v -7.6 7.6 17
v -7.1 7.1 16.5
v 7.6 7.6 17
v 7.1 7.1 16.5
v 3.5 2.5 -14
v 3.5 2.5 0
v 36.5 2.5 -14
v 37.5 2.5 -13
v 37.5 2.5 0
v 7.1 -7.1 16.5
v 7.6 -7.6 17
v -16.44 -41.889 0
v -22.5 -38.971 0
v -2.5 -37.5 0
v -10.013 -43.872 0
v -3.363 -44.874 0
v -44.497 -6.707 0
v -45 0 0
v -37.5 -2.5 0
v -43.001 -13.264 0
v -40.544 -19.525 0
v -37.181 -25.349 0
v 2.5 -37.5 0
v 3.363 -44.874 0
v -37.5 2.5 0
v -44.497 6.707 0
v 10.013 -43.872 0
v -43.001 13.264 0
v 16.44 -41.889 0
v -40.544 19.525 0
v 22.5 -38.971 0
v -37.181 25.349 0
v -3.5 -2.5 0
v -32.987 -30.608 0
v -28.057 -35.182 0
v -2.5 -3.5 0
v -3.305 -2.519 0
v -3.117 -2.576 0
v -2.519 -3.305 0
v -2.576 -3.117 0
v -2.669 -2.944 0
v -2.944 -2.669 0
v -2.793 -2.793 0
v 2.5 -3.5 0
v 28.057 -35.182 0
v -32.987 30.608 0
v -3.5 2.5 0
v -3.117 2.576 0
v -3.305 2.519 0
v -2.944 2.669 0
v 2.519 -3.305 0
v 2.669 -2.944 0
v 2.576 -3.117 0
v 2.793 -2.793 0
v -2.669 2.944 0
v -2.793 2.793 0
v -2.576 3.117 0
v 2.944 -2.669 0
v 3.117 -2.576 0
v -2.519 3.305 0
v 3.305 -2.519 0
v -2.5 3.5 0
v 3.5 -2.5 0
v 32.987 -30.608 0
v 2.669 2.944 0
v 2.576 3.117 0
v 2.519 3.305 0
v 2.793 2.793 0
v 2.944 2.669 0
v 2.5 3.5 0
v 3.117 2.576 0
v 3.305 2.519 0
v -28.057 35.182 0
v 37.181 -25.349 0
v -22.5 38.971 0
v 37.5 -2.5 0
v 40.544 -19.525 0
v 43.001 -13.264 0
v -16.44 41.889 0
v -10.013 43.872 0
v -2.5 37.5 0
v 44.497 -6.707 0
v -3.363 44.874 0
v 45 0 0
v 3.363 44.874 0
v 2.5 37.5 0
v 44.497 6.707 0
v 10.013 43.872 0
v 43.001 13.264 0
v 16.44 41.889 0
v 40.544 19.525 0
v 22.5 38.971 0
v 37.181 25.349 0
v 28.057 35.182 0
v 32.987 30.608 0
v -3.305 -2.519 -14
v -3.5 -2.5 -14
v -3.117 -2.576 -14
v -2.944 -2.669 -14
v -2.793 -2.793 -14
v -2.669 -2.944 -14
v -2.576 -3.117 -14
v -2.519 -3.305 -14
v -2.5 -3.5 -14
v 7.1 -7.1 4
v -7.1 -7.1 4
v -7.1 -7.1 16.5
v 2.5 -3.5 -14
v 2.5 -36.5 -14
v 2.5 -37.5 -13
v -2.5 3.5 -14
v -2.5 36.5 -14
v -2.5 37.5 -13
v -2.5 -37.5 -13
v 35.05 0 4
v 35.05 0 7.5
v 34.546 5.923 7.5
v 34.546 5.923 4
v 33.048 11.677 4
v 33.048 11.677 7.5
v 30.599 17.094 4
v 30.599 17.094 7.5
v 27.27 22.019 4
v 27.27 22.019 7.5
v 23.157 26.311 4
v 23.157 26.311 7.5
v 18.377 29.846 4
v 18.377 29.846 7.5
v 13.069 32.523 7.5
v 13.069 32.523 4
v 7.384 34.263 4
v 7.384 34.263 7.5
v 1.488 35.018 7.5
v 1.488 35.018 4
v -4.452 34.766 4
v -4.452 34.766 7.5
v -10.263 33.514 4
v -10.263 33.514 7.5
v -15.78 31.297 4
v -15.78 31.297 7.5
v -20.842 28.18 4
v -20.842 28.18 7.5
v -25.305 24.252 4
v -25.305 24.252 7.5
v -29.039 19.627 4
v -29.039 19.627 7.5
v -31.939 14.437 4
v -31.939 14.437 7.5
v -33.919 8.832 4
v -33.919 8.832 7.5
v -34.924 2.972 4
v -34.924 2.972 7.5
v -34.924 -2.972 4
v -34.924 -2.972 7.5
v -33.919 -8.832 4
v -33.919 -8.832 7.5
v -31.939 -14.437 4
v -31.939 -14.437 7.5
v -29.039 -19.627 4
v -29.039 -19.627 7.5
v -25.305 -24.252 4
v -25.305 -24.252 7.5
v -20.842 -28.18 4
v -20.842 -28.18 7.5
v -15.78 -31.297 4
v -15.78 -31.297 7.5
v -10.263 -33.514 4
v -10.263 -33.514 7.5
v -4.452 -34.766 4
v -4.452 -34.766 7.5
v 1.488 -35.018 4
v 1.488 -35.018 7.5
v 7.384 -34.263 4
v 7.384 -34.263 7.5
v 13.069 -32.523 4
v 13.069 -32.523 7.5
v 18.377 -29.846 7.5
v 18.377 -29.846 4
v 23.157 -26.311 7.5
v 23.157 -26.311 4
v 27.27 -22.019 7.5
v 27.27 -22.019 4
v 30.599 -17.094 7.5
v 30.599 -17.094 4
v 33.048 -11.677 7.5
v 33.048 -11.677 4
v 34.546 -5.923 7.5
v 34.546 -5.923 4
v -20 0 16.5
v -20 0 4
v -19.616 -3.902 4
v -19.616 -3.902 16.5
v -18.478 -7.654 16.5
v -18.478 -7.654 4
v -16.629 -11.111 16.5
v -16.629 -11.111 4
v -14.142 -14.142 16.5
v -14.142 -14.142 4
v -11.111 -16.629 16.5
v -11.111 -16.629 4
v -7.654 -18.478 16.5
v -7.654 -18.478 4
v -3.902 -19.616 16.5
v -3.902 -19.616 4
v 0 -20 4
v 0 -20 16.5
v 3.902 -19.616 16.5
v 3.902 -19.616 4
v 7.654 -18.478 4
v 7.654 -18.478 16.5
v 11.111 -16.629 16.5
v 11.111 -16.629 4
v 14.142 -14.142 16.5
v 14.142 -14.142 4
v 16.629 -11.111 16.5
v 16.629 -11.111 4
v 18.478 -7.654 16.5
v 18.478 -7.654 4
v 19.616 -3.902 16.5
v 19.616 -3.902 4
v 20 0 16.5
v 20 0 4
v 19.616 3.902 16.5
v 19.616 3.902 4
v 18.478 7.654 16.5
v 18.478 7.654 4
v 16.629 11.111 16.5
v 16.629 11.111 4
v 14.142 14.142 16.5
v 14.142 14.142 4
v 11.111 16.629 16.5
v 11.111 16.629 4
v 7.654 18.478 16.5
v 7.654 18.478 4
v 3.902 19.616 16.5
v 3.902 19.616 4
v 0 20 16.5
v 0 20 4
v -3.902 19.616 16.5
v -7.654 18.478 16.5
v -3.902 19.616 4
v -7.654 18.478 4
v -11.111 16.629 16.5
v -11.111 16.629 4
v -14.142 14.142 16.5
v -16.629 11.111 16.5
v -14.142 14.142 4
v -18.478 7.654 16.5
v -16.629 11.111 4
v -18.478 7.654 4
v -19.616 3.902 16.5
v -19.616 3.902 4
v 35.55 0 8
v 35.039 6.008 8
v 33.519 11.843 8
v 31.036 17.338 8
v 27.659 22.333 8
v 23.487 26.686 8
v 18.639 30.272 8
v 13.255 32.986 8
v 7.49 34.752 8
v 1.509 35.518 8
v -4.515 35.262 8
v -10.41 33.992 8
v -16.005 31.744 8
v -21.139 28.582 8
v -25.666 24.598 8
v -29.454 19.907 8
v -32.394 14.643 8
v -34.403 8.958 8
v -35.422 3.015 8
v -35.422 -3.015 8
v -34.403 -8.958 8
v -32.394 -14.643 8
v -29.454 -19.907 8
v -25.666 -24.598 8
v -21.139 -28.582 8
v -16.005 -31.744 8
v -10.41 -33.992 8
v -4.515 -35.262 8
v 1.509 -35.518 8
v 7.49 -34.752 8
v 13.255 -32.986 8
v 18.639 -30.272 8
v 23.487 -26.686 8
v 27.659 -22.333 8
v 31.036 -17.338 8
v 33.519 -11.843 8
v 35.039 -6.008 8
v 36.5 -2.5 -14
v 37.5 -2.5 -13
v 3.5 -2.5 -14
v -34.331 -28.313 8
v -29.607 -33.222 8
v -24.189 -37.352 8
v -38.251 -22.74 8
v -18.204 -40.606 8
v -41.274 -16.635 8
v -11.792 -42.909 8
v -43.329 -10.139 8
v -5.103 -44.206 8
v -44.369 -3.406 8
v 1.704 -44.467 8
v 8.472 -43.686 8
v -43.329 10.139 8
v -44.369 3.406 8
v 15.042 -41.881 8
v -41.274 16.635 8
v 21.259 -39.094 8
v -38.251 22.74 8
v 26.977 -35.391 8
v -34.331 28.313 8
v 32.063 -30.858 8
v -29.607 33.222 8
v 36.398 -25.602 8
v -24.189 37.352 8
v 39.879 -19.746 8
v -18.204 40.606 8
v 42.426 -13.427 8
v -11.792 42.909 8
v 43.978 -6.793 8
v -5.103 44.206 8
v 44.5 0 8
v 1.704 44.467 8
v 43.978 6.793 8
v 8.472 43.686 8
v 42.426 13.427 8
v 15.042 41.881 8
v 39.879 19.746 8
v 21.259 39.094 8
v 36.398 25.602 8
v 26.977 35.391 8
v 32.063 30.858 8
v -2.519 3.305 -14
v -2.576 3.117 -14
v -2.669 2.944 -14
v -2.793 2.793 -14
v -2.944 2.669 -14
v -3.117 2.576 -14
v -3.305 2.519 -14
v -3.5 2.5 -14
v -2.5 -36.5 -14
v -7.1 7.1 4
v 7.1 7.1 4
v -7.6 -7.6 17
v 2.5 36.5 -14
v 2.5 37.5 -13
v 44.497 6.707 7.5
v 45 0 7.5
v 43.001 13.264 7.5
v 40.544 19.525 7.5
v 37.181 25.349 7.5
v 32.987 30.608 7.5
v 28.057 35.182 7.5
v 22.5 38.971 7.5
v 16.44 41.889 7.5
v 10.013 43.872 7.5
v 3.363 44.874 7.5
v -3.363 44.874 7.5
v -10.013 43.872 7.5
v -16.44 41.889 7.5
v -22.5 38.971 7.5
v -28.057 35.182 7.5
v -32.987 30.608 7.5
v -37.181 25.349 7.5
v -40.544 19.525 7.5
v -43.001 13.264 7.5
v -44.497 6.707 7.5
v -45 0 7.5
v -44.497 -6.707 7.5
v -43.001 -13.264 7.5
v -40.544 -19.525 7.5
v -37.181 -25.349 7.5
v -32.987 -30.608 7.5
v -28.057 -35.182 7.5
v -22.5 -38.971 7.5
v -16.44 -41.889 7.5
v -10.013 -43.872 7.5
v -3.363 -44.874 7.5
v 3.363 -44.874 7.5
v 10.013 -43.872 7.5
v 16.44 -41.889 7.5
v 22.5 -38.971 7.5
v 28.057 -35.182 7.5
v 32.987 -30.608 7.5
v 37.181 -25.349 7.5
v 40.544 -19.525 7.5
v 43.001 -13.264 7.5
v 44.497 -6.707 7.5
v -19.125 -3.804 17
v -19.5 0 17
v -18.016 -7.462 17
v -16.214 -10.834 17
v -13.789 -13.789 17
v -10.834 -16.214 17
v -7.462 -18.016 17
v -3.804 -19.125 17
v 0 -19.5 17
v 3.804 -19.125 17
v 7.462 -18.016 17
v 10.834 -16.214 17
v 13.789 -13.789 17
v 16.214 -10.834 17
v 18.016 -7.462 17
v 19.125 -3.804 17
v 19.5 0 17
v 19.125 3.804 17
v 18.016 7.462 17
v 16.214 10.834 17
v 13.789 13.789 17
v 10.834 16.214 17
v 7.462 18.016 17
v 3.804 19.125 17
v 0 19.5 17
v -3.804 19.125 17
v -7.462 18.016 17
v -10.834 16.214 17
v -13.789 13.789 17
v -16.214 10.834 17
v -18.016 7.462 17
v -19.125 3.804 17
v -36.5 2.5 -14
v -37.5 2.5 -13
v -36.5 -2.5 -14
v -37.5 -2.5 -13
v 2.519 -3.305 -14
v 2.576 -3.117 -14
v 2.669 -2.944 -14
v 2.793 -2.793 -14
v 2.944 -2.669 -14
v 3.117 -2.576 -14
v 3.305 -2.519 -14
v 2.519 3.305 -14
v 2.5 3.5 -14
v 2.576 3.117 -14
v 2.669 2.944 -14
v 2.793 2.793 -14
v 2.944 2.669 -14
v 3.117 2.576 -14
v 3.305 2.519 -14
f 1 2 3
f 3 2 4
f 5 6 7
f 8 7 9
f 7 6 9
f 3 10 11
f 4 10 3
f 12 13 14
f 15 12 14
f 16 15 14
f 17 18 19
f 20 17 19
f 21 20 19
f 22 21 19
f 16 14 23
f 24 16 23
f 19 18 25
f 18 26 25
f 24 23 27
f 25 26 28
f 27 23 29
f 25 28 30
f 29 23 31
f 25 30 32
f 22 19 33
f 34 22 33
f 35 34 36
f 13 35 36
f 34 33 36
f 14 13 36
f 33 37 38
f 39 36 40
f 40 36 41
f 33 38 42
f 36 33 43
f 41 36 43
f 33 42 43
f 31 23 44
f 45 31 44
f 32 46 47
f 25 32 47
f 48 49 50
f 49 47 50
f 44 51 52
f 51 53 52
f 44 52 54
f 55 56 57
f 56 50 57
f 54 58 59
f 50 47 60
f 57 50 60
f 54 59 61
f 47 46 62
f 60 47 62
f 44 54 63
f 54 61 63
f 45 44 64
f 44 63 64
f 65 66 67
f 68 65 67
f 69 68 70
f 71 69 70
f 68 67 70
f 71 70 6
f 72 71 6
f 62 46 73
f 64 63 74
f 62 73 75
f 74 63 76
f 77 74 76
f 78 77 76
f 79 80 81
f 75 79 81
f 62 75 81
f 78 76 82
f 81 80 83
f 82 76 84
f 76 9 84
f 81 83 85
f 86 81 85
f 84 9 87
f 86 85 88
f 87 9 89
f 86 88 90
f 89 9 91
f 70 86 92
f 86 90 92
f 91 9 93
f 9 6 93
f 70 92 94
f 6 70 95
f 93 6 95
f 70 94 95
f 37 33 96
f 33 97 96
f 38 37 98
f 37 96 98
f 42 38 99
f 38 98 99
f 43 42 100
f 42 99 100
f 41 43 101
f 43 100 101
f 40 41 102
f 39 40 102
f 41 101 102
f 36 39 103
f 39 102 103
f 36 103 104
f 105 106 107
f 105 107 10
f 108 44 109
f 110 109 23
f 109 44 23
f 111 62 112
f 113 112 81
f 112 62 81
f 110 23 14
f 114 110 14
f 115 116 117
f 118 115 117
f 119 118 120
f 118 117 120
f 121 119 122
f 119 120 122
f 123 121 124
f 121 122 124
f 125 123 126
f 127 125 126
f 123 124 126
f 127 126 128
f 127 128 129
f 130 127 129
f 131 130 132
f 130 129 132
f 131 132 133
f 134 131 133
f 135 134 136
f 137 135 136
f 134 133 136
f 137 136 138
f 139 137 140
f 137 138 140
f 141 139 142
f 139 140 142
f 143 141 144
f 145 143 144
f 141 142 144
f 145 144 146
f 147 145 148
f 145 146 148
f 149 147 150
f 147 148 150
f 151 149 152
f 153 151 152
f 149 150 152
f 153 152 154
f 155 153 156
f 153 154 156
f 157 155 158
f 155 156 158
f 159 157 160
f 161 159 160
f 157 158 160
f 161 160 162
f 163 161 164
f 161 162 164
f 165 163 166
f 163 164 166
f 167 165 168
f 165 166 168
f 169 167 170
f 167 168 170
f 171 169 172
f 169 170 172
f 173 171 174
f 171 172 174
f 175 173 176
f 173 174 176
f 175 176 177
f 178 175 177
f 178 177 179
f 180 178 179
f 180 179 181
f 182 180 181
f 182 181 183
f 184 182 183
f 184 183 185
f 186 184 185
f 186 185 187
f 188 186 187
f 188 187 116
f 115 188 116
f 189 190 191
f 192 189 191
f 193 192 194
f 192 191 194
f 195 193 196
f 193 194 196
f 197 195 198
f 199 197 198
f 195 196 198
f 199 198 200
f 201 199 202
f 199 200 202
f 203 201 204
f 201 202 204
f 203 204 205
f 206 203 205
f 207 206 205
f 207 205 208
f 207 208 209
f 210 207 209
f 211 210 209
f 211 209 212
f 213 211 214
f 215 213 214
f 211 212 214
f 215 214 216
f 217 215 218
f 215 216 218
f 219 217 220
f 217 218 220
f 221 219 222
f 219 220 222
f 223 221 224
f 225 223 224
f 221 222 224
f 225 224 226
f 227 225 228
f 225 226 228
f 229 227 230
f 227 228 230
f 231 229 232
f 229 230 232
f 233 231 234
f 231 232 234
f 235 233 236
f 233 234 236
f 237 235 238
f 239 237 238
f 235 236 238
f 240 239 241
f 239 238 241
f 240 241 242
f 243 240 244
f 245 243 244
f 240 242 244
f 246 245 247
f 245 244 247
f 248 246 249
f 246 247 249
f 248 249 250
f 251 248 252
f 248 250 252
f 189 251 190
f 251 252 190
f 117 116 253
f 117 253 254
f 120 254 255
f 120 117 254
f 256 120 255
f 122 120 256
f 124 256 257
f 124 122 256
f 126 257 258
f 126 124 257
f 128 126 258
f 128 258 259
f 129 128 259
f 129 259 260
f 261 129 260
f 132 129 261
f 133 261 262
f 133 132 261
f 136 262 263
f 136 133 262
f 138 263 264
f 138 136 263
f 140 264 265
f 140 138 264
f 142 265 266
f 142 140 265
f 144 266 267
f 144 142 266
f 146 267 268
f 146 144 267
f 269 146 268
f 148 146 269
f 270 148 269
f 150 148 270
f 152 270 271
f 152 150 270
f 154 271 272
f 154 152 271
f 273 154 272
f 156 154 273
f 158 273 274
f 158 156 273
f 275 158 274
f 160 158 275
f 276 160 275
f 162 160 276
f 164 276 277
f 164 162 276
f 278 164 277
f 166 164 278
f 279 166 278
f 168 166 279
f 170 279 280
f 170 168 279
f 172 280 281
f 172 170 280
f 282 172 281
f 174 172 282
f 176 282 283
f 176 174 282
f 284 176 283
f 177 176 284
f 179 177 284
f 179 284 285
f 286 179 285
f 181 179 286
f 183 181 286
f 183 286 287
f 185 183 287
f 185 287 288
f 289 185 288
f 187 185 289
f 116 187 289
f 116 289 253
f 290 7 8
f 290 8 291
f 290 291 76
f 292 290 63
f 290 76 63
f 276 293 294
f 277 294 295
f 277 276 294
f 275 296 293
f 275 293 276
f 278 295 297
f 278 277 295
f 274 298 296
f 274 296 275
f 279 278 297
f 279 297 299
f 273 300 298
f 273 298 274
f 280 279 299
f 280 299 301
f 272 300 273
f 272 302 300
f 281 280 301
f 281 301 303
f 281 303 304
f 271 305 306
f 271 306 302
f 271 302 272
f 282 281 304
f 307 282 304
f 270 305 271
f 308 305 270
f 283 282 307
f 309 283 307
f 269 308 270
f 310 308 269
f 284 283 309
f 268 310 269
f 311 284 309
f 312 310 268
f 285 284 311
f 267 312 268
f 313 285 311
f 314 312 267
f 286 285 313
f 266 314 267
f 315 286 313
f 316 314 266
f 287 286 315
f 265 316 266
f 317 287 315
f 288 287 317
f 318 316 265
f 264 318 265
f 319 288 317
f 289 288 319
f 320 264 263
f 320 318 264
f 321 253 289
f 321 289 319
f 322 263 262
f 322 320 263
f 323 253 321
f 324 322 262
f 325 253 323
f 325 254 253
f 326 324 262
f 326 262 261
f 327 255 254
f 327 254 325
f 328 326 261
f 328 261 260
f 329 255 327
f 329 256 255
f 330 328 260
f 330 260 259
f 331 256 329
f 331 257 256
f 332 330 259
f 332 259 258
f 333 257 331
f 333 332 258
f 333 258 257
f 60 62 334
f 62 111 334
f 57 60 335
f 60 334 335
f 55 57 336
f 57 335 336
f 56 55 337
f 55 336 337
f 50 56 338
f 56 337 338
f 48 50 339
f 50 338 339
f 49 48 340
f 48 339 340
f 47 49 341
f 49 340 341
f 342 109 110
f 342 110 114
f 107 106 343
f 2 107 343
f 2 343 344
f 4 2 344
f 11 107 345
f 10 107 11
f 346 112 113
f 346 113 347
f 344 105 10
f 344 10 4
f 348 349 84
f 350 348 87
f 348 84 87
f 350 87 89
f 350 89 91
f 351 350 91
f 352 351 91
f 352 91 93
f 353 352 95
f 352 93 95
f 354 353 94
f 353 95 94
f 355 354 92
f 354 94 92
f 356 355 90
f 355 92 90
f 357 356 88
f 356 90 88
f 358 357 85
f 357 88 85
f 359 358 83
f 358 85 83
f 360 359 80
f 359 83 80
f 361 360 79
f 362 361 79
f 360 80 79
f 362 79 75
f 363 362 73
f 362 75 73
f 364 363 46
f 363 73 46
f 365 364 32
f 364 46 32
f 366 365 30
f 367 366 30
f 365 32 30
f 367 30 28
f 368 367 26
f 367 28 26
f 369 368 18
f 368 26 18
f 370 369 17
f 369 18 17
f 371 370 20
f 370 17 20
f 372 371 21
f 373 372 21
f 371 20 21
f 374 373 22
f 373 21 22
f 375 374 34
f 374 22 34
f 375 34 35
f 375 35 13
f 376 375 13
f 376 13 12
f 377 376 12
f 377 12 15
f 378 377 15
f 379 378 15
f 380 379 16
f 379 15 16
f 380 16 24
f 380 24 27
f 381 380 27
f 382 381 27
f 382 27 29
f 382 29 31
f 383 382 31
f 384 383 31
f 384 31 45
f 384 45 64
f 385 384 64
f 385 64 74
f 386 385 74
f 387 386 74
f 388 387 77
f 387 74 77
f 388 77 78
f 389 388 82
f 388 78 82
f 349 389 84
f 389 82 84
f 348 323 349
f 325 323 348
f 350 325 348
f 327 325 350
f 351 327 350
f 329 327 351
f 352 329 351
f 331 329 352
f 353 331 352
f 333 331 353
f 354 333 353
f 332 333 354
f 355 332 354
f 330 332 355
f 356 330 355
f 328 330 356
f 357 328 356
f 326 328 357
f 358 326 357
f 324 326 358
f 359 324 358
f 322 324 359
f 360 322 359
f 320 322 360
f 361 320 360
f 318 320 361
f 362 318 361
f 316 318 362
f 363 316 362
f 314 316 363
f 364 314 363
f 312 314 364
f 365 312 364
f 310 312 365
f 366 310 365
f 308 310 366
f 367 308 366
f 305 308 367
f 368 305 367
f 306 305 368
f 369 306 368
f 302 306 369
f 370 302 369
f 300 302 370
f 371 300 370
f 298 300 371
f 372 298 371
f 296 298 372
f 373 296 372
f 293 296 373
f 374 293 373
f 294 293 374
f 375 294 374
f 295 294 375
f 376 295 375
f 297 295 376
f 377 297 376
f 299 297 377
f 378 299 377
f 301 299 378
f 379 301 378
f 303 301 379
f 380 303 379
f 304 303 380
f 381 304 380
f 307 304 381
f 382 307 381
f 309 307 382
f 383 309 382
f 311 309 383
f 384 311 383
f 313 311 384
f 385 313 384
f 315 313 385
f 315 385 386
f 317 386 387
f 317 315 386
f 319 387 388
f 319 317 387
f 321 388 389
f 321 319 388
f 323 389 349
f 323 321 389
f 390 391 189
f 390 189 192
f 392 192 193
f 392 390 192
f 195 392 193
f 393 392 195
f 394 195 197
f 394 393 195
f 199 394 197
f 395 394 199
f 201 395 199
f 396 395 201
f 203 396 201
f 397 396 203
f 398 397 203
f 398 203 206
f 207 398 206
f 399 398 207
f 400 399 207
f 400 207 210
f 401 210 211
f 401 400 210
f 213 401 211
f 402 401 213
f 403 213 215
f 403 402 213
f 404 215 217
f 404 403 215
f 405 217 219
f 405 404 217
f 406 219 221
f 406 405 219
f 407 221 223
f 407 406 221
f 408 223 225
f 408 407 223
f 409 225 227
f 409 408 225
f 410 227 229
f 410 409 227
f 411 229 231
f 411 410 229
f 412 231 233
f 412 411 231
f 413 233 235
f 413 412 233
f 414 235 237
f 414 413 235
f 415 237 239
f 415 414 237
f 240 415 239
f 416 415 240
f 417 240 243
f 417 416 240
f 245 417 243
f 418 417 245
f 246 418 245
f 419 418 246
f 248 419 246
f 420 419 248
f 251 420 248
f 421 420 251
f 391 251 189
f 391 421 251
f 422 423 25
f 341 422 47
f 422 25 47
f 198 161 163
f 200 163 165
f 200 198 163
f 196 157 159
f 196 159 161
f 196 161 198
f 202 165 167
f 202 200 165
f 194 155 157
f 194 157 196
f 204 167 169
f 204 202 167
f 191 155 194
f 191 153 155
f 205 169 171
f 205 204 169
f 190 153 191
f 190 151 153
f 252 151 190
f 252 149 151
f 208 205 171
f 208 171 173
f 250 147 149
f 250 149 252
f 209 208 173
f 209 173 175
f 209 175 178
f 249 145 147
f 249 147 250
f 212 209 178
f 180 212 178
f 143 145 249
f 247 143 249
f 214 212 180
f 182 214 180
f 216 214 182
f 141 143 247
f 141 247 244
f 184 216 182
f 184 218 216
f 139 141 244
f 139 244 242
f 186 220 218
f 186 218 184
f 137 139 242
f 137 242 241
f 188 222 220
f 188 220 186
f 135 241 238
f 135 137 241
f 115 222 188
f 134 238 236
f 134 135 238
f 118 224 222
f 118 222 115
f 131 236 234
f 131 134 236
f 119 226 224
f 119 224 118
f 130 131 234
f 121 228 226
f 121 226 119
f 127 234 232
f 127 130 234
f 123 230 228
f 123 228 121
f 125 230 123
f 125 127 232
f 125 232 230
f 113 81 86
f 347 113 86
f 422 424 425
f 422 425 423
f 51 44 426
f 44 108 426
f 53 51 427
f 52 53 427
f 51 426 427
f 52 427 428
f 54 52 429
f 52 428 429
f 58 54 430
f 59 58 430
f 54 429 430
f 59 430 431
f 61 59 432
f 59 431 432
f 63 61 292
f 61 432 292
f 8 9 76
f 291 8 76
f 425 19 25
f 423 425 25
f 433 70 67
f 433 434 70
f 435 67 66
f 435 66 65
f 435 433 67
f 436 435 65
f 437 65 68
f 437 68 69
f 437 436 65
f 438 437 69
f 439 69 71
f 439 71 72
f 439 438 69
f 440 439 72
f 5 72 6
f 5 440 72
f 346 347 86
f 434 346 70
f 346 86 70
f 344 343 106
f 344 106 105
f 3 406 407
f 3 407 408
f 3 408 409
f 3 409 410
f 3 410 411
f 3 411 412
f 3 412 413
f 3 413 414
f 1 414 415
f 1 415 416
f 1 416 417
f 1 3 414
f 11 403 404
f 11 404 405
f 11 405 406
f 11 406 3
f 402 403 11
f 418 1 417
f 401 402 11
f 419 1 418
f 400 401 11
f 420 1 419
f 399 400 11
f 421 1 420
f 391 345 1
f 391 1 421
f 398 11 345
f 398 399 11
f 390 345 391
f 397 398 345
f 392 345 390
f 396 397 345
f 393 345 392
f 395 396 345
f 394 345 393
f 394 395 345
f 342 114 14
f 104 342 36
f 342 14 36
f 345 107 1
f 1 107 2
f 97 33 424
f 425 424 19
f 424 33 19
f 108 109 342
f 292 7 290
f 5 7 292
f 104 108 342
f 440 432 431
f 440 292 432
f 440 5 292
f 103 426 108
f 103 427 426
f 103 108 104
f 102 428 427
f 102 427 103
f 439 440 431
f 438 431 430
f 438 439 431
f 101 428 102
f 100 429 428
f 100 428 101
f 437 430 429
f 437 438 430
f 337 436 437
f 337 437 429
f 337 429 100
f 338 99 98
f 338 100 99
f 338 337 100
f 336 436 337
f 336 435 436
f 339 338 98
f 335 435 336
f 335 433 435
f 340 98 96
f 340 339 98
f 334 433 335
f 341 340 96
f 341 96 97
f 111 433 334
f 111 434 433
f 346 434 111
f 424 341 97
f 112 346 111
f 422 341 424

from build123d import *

# Parameters (mm, degrees)
SKETCH1_R           = 45
BOSS_EXTRUDE1_DEPTH = 8
SKETCH2_R           = 35.05
CUT_EXTRUDE1_DEPTH  = 4
SKETCH3_R           = 20
SKETCH3_W           = 14.2
SKETCH3_H           = 14.2
BOSS_EXTRUDE2_DEPTH = 13
CHAMFER1_SIZE       = 0.5
BOSS_EXTRUDE3_DEPTH = 14
CHAMFER3_SIZE       = 1
FILLET1_R           = 1


with BuildPart() as part:
    # Sketch1 → Boss-Extrude1 (new body)
    with BuildSketch(Plane.XY):
        Circle(SKETCH1_R)
    extrude(amount=BOSS_EXTRUDE1_DEPTH)

    # Sketch2 → Cut-Extrude1 (cut)
    with BuildSketch(Plane.XY.offset(8)):
        Circle(SKETCH2_R)
    extrude(amount=-CUT_EXTRUDE1_DEPTH, mode=Mode.SUBTRACT)

    # Sketch3 → Boss-Extrude2 (add)
    with BuildSketch(Plane.XY.offset(4)):
        with Locations(Location((0, 0, 0), (0, 0, 180))):
            Circle(SKETCH3_R)
        Rectangle(SKETCH3_W, SKETCH3_H, mode=Mode.SUBTRACT)
    extrude(amount=BOSS_EXTRUDE2_DEPTH)

    # Chamfer1
    chamfer1_edges = [part.edges().sort_by_distance(p)[0] for p in [
        (20, 0, 17),
        (-7.1, 0, 17),
        (0, -7.1, 17),
        (7.1, 0, 17),
        (0, 7.1, 17),
        (-45, 0, 8),
        (-35.05, 0, 8),
    ]]
    chamfer(chamfer1_edges, length=CHAMFER1_SIZE)

    # Sketch4 → Boss-Extrude3 (add)
    with BuildSketch(Plane(origin=(0, 0, 0), x_dir=(-1, 0, 0), z_dir=(0, 0, -1))):
        Polygon((-2.5, 2.5), (-37.5, 2.5), (-37.5, -2.5), (-2.5, -2.5), (-2.5, -37.5), (2.5, -37.5), (2.5, -2.5), (37.5, -2.5), (37.5, 2.5), (2.5, 2.5), (2.5, 37.5), (-2.5, 37.5), align=None)
    extrude(amount=BOSS_EXTRUDE3_DEPTH)

    # Chamfer3
    chamfer3_edges = [part.edges().sort_by_distance(p)[0] for p in [
        (0, 37.5, -14),
        (37.5, 0, -14),
        (0, -37.5, -14),
        (-37.5, 0, -14),
    ]]
    chamfer(chamfer3_edges, length=CHAMFER3_SIZE)

    # Fillet1
    fillet1_edges = [part.edges().sort_by_distance(p)[0] for p in [
        (-2.5, 2.5, -7),
        (2.5, 2.5, -7),
        (2.5, -2.5, -7),
        (-2.5, -2.5, -7),
    ]]
    fillet(fillet1_edges, radius=FILLET1_R)


solid = part.part
